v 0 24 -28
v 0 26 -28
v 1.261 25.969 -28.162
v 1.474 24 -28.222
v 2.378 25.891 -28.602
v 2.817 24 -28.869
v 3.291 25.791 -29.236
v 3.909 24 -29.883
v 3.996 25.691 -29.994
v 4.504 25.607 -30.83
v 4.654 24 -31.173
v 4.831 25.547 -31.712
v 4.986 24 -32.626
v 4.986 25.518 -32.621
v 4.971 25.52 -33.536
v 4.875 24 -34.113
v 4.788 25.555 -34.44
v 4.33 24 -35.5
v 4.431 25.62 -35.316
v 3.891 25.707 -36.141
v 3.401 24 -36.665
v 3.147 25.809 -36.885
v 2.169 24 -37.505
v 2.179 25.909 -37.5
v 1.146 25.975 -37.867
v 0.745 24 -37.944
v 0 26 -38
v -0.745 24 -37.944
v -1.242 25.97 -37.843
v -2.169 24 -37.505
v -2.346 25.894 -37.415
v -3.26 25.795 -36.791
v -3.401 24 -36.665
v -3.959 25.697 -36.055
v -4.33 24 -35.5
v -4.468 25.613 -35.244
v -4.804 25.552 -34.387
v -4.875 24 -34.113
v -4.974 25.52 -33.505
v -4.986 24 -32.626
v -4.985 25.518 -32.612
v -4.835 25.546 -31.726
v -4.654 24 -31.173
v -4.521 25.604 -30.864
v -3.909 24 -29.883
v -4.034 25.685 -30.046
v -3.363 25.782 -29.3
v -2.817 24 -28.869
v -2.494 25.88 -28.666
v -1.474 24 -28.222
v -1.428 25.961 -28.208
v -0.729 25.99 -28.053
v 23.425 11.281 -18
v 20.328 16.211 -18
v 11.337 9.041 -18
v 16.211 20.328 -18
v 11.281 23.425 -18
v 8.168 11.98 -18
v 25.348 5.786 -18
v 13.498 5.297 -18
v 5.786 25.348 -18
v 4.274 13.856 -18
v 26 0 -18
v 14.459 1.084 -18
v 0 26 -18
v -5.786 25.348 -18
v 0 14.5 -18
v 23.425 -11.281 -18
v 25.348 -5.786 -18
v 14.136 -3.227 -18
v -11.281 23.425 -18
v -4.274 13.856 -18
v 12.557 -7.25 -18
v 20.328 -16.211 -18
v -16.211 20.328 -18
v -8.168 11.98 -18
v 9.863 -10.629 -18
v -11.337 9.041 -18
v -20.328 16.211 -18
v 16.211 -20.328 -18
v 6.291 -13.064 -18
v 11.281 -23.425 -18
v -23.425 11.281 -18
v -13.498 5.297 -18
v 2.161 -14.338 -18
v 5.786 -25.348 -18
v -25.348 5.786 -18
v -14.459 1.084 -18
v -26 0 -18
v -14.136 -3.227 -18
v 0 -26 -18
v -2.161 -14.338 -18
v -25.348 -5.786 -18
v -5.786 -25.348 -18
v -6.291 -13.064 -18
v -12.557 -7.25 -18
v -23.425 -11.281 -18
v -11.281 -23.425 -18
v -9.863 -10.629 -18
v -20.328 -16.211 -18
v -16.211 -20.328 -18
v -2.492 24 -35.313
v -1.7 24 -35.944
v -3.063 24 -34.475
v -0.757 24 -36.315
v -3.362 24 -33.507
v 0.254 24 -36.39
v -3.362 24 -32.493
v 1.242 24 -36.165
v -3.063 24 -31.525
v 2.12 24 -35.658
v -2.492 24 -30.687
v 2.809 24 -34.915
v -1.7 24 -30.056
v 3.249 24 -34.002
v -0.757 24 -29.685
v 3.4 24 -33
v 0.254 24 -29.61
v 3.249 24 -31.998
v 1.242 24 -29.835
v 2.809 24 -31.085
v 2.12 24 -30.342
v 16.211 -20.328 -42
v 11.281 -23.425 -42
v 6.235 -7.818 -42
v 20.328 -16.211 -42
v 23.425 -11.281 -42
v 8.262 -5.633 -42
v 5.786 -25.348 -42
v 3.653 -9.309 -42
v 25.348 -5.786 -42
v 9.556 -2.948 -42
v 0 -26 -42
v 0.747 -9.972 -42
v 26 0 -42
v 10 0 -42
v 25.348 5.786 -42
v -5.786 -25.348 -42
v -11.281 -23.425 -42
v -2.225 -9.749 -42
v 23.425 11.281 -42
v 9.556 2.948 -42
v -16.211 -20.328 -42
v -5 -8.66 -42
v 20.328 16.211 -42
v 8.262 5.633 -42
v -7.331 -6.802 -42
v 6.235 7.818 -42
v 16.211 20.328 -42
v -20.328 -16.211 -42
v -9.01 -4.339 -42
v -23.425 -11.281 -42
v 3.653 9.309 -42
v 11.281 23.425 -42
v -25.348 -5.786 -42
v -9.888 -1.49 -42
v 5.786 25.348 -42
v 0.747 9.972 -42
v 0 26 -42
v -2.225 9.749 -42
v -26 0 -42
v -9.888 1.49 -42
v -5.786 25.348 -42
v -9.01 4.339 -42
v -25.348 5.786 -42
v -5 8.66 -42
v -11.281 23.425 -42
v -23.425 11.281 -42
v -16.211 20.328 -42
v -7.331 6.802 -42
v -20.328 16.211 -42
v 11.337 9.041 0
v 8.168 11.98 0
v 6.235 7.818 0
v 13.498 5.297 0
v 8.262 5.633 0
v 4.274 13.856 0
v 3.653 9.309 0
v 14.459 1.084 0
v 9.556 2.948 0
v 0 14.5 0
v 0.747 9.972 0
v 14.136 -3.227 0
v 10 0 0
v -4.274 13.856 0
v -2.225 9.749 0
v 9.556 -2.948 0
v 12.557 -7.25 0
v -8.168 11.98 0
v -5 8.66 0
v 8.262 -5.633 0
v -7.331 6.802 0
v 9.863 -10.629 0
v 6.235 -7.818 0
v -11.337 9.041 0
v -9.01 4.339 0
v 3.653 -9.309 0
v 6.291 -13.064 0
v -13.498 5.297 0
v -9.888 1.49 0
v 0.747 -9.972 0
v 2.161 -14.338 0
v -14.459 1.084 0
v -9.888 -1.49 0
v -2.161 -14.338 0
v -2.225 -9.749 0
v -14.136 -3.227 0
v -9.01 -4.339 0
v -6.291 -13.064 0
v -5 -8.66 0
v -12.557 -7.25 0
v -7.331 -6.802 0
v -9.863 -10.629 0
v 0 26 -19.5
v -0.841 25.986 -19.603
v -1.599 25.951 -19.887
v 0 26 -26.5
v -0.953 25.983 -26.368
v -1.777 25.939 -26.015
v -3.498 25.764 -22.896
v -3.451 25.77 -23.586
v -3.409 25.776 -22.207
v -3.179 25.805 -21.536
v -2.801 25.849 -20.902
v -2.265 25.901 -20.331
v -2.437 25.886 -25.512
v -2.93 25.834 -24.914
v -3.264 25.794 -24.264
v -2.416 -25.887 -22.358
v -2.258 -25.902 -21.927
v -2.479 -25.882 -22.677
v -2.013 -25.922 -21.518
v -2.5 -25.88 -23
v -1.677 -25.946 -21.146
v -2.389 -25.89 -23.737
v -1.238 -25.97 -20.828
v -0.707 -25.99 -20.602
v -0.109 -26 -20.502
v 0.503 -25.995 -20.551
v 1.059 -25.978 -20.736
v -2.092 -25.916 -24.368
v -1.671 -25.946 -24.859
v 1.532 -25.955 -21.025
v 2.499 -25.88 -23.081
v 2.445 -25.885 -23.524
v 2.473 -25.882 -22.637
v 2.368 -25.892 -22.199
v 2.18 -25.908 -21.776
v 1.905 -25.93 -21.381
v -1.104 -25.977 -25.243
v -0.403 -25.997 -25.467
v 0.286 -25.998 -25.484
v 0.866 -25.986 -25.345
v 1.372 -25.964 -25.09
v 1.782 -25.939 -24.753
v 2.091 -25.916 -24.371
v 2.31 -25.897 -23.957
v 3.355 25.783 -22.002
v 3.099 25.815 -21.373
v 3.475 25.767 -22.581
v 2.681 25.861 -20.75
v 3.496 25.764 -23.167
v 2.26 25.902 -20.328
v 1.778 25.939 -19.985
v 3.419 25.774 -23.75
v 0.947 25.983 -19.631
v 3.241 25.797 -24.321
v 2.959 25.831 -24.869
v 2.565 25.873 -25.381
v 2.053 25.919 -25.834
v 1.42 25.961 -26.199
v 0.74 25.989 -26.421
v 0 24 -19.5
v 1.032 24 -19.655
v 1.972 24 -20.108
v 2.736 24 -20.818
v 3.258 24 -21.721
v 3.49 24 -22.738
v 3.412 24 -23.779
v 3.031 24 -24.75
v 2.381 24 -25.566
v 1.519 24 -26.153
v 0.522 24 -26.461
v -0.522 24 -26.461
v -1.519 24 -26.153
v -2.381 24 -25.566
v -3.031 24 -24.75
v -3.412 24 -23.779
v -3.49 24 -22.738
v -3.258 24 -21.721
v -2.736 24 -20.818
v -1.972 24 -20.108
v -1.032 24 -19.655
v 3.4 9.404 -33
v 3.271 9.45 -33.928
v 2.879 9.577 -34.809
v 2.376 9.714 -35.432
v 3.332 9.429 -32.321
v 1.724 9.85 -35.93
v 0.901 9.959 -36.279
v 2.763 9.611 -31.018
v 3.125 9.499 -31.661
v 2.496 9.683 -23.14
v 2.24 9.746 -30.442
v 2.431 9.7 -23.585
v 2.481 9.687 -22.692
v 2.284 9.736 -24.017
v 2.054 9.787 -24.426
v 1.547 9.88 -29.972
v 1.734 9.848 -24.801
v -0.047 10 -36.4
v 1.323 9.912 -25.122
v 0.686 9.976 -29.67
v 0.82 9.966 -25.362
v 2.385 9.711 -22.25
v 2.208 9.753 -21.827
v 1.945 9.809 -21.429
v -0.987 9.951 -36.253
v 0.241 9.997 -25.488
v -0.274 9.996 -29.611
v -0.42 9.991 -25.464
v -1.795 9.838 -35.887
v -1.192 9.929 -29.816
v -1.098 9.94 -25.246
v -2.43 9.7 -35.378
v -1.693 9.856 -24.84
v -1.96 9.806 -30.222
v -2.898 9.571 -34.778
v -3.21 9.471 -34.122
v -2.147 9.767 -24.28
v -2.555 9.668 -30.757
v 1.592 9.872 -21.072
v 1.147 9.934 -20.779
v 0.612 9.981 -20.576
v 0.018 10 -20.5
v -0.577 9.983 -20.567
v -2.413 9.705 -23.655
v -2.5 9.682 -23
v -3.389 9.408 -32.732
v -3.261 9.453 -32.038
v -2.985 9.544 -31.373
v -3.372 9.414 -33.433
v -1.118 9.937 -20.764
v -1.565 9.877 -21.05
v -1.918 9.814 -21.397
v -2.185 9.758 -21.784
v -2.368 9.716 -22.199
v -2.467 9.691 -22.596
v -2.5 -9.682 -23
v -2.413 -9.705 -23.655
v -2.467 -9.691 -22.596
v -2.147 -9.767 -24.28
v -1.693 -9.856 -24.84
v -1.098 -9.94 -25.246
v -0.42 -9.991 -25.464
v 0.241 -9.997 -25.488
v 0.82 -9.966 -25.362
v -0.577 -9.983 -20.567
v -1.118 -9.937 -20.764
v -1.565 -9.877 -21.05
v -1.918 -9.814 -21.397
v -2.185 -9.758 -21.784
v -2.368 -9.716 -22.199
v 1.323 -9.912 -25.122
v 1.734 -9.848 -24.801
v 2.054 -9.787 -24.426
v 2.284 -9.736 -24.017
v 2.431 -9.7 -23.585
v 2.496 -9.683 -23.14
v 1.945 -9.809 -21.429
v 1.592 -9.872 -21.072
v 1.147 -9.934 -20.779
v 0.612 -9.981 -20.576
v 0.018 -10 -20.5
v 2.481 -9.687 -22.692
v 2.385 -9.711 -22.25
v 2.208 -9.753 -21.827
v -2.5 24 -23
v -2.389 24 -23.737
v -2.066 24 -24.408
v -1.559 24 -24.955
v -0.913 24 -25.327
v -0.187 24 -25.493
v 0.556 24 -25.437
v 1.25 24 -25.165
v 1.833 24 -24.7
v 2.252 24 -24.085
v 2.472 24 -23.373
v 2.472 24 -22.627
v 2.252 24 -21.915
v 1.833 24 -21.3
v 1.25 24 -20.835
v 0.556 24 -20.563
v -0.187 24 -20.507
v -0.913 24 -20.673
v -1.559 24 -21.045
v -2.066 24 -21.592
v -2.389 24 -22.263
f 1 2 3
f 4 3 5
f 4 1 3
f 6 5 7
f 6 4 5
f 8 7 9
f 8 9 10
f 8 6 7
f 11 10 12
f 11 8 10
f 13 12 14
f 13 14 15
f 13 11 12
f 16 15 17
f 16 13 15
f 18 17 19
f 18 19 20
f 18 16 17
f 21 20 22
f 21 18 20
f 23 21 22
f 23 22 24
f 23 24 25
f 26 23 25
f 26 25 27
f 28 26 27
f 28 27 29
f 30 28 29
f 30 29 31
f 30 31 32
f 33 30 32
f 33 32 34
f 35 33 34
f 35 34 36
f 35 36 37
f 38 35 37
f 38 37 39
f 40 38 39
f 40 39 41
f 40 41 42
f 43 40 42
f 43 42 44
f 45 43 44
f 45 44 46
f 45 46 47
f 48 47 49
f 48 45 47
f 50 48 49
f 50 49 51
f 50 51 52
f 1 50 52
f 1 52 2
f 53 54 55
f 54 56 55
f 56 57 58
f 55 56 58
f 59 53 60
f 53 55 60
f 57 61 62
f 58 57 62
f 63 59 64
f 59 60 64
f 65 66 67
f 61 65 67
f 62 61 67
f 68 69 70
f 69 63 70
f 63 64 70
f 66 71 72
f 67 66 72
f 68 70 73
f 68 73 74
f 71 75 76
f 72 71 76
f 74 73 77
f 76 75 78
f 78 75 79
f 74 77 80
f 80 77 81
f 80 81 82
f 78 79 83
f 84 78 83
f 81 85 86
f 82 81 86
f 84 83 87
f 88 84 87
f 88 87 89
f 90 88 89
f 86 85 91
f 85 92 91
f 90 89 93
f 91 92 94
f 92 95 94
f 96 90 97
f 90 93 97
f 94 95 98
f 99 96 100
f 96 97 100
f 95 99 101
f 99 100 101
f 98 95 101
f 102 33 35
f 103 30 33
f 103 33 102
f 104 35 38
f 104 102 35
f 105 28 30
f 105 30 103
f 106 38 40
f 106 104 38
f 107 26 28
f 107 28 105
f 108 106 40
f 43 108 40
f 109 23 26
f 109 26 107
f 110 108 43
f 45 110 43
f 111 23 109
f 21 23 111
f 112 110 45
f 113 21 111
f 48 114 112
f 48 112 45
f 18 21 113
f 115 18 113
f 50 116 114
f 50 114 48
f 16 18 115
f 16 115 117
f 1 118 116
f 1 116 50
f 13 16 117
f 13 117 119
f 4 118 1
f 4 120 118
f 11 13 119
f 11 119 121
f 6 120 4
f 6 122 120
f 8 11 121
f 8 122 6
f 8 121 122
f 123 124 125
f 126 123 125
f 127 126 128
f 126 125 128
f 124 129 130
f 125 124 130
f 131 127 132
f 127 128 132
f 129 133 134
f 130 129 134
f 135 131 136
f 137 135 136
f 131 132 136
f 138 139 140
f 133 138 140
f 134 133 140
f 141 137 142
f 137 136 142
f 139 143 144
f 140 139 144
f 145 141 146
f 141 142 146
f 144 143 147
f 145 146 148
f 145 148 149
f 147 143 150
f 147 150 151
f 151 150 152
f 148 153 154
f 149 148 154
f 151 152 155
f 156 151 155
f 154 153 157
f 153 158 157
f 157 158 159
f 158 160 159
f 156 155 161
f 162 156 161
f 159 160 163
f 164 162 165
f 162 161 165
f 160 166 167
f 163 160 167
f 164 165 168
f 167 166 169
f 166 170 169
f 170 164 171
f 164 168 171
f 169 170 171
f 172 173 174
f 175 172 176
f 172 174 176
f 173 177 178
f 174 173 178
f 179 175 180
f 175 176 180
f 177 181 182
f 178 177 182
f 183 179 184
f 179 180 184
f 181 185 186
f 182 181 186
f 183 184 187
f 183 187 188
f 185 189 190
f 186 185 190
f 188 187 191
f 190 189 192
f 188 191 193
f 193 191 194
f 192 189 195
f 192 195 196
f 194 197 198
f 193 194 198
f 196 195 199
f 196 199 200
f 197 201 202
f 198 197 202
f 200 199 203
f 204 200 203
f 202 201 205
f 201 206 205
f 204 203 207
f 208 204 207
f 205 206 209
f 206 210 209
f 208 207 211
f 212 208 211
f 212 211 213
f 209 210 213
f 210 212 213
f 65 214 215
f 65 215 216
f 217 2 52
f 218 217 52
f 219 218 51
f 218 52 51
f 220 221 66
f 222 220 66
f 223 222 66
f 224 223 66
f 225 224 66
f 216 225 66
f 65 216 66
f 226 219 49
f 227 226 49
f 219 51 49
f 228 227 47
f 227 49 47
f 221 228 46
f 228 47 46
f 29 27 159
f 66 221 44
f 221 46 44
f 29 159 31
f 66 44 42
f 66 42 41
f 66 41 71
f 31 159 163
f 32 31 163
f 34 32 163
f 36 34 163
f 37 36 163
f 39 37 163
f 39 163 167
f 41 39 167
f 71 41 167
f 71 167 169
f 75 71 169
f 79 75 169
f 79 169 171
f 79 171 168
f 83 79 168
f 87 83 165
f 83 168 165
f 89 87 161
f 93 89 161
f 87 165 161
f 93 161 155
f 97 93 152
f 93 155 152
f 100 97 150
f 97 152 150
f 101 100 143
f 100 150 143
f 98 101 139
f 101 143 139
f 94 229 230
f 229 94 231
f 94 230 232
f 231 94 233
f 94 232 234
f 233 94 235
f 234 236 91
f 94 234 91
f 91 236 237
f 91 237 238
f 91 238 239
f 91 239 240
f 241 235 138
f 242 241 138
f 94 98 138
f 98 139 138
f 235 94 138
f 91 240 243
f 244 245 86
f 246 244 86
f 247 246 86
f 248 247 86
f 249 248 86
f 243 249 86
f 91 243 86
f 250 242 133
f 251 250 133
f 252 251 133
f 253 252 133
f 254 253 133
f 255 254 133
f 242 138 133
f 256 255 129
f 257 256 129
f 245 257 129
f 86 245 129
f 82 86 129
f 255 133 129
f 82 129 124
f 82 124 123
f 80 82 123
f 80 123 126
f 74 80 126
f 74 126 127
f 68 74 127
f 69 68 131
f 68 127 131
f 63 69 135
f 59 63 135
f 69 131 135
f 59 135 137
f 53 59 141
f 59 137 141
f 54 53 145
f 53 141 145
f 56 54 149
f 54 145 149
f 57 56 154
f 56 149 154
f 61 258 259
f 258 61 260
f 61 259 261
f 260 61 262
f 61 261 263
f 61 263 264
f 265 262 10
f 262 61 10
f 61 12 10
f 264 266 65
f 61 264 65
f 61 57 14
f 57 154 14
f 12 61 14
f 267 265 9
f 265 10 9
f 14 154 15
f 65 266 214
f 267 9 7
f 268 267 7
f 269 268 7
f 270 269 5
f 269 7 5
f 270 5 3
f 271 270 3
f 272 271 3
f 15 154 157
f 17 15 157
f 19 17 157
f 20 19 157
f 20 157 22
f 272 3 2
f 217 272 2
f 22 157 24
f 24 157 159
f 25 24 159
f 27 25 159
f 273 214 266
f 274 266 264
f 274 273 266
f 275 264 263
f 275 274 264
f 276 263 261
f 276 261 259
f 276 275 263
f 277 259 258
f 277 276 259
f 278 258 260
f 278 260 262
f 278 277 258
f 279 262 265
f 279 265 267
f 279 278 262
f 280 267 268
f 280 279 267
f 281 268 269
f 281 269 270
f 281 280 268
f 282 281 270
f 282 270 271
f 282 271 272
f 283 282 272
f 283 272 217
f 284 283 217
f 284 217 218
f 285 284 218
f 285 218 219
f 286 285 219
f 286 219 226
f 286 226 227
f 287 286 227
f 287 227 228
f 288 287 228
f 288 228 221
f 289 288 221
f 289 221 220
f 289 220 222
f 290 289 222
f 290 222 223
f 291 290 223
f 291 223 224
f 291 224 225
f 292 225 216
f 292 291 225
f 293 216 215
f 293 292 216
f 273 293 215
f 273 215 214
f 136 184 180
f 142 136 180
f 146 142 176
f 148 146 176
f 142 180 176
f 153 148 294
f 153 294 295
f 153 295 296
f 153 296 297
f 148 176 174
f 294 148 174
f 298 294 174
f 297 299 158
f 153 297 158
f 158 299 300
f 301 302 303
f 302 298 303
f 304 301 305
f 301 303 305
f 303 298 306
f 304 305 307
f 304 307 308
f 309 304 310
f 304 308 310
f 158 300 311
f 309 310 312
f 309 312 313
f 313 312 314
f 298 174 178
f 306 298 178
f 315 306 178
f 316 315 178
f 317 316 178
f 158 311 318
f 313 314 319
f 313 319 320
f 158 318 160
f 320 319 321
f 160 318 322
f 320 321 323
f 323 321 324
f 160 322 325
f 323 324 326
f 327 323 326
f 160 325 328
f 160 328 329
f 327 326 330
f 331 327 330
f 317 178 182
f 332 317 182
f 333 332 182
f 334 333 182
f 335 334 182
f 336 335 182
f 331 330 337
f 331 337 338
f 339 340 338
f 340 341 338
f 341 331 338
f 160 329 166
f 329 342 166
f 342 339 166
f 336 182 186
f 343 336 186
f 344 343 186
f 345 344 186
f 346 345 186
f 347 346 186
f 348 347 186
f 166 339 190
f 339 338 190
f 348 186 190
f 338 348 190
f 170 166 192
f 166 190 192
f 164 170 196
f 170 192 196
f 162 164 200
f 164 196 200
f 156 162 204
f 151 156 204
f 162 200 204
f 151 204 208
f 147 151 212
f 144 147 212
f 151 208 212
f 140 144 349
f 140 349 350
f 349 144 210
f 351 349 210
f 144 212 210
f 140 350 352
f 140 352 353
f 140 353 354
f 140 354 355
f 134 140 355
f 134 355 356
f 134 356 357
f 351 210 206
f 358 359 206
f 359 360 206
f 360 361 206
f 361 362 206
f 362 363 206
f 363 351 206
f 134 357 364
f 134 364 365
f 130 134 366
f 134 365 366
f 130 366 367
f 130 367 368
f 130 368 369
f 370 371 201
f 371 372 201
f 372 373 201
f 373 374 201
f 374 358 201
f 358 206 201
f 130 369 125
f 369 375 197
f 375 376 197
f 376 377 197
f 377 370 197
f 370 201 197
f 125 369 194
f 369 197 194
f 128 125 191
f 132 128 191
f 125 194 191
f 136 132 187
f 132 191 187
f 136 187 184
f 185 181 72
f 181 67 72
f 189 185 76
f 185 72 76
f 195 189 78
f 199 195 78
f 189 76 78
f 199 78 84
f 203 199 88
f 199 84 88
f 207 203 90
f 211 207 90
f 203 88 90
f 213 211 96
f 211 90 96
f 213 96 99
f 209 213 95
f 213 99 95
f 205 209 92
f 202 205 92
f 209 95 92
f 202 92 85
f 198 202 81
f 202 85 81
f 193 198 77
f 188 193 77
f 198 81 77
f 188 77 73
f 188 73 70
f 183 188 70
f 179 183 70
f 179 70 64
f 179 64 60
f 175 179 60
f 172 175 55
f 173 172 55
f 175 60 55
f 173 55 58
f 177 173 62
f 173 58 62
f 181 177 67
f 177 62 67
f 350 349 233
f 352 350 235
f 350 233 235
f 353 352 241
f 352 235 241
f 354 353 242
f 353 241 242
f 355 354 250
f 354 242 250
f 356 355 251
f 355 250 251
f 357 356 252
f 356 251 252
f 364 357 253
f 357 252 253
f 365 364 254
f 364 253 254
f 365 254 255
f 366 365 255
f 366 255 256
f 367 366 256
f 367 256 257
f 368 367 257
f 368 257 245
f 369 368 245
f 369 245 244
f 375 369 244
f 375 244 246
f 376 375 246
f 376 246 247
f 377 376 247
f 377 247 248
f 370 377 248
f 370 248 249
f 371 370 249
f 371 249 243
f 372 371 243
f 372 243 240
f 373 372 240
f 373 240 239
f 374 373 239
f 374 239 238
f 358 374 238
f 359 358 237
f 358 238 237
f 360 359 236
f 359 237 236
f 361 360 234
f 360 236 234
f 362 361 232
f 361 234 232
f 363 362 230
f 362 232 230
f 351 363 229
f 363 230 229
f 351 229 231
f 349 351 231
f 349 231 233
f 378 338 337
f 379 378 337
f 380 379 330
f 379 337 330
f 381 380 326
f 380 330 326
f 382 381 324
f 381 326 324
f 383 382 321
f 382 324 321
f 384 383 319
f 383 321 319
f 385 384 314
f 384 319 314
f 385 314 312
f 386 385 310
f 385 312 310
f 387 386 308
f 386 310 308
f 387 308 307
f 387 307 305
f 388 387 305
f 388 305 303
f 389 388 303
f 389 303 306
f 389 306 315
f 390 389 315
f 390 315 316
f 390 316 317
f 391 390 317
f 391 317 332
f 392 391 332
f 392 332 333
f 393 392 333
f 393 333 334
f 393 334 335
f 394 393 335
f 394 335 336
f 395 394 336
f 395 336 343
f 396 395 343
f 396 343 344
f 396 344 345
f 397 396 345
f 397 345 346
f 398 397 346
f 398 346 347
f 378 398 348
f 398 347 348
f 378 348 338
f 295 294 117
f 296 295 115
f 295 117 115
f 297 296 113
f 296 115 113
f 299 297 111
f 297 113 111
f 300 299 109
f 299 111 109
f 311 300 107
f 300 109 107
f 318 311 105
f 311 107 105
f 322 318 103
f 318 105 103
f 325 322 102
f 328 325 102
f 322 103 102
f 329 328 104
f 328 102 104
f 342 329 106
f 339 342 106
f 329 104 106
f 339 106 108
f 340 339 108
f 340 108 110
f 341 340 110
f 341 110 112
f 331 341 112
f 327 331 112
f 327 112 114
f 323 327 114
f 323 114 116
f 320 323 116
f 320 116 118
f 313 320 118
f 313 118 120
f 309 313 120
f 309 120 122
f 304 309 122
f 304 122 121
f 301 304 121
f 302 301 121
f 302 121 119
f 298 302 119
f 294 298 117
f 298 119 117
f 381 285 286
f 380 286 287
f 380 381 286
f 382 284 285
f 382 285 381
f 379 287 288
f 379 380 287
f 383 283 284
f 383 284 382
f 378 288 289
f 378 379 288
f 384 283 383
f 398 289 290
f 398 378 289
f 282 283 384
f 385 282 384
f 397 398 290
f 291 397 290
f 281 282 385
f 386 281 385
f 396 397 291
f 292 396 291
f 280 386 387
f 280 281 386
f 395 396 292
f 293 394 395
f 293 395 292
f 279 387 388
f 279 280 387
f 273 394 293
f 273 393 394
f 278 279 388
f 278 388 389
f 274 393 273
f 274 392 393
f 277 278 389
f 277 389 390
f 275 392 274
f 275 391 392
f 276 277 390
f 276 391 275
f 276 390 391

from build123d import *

# Parameters (mm, degrees)
SKETCH2_R                   = 10
CUT_EXTRUDE1_DEPTH          = 56.821142948
CUT_EXTRUDE2_REACH          = 81.821
CUT_EXTRUDE2_END_RADIUS     = 26
CUT_EXTRUDE2_START          = 24
SKETCH3_R                   = 5
SKETCH3_R_2                 = 3.5
M8X1_25_TAPPED_HOLE1_REACH  = 72.285
M8X1_25_TAPPED_HOLE1_BORE_R = 3.4
F_5_0_5_DIAMETER_HOLE1_D    = 5


with BuildPart() as part:
    # Sketch1 → Revolve1 (revolve)
    with BuildSketch(Plane(origin=(0, 0, 0), x_dir=(0, 0, -1), z_dir=(1, 0, 0))):
        Polygon((0, 0), (0, 14.5), (18, 14.5), (18, 26), (42, 26), (42, 0), align=None)
    revolve(axis=Axis((0, 0, -42), (0, 0, 1)))

    # Sketch2 → Cut-Extrude1 (cut, through all)
    with BuildSketch(Plane.XY):
        Circle(SKETCH2_R)
    extrude(amount=-CUT_EXTRUDE1_DEPTH, mode=Mode.SUBTRACT)

    # Cut-Extrude2: up to this cylinder (the profile starts inside it)
    cut_extrude2_end = Plane(origin=(0, 0, -28), z_dir=(0, 0, -1)) * Cylinder(CUT_EXTRUDE2_END_RADIUS, 226.642, mode=Mode.PRIVATE)
    # Sketch3 → Cut-Extrude2 (cut, up to the surface)
    with BuildSketch(Plane(origin=(0, 0, 0), x_dir=(1, 0, 0), z_dir=(0, 1, 0)).offset(CUT_EXTRUDE2_START), mode=Mode.PRIVATE) as cut_extrude2_sk1:
        with Locations(Location((0, 33, 0), (0, 0, 270))):
            Circle(SKETCH3_R)
    cut_extrude2_tool1 = extrude(cut_extrude2_sk1.sketch, amount=CUT_EXTRUDE2_REACH, mode=Mode.PRIVATE) & cut_extrude2_end
    add(cut_extrude2_tool1.solids().sort_by_distance((0, 24, -33))[0], mode=Mode.SUBTRACT)
    # Sketch3 → Cut-Extrude2 (cut, up to the surface)
    with BuildSketch(Plane(origin=(0, 0, 0), x_dir=(1, 0, 0), z_dir=(0, 1, 0)).offset(CUT_EXTRUDE2_START), mode=Mode.PRIVATE) as cut_extrude2_sk2:
        with Locations(Location((0, 23, 0), (0, 0, 270))):
            Circle(SKETCH3_R_2)
    cut_extrude2_tool2 = extrude(cut_extrude2_sk2.sketch, amount=CUT_EXTRUDE2_REACH, mode=Mode.PRIVATE) & cut_extrude2_end
    add(cut_extrude2_tool2.solids().sort_by_distance((0, 24, -23))[0], mode=Mode.SUBTRACT)

    # M8x1.25 Tapped Hole1 bore → M8x1.25 Tapped Hole1 (cut, up to next)
    with BuildSketch(Plane(origin=(0, 24, 0), x_dir=(1, 0, 0), z_dir=(0, 1, 0)), mode=Mode.PRIVATE) as m8x1_25_tapped_hole1_sk1:
        with Locations((0, 33)):
            Circle(M8X1_25_TAPPED_HOLE1_BORE_R)
    m8x1_25_tapped_hole1_tool1 = extrude(m8x1_25_tapped_hole1_sk1.sketch, amount=-M8X1_25_TAPPED_HOLE1_REACH, mode=Mode.PRIVATE) & part.part
    add(m8x1_25_tapped_hole1_tool1.solids().sort_by_distance((0, 24, -33))[0], mode=Mode.SUBTRACT)

    # Ø5.0 (5) Diameter Hole1 (through all)
    with Locations(Plane(origin=(0, 24, 0), x_dir=(1, 0, 0), z_dir=(0, 1, 0))):
        with Locations((0, 23)):
            Hole(F_5_0_5_DIAMETER_HOLE1_D / 2)


solid = part.part
